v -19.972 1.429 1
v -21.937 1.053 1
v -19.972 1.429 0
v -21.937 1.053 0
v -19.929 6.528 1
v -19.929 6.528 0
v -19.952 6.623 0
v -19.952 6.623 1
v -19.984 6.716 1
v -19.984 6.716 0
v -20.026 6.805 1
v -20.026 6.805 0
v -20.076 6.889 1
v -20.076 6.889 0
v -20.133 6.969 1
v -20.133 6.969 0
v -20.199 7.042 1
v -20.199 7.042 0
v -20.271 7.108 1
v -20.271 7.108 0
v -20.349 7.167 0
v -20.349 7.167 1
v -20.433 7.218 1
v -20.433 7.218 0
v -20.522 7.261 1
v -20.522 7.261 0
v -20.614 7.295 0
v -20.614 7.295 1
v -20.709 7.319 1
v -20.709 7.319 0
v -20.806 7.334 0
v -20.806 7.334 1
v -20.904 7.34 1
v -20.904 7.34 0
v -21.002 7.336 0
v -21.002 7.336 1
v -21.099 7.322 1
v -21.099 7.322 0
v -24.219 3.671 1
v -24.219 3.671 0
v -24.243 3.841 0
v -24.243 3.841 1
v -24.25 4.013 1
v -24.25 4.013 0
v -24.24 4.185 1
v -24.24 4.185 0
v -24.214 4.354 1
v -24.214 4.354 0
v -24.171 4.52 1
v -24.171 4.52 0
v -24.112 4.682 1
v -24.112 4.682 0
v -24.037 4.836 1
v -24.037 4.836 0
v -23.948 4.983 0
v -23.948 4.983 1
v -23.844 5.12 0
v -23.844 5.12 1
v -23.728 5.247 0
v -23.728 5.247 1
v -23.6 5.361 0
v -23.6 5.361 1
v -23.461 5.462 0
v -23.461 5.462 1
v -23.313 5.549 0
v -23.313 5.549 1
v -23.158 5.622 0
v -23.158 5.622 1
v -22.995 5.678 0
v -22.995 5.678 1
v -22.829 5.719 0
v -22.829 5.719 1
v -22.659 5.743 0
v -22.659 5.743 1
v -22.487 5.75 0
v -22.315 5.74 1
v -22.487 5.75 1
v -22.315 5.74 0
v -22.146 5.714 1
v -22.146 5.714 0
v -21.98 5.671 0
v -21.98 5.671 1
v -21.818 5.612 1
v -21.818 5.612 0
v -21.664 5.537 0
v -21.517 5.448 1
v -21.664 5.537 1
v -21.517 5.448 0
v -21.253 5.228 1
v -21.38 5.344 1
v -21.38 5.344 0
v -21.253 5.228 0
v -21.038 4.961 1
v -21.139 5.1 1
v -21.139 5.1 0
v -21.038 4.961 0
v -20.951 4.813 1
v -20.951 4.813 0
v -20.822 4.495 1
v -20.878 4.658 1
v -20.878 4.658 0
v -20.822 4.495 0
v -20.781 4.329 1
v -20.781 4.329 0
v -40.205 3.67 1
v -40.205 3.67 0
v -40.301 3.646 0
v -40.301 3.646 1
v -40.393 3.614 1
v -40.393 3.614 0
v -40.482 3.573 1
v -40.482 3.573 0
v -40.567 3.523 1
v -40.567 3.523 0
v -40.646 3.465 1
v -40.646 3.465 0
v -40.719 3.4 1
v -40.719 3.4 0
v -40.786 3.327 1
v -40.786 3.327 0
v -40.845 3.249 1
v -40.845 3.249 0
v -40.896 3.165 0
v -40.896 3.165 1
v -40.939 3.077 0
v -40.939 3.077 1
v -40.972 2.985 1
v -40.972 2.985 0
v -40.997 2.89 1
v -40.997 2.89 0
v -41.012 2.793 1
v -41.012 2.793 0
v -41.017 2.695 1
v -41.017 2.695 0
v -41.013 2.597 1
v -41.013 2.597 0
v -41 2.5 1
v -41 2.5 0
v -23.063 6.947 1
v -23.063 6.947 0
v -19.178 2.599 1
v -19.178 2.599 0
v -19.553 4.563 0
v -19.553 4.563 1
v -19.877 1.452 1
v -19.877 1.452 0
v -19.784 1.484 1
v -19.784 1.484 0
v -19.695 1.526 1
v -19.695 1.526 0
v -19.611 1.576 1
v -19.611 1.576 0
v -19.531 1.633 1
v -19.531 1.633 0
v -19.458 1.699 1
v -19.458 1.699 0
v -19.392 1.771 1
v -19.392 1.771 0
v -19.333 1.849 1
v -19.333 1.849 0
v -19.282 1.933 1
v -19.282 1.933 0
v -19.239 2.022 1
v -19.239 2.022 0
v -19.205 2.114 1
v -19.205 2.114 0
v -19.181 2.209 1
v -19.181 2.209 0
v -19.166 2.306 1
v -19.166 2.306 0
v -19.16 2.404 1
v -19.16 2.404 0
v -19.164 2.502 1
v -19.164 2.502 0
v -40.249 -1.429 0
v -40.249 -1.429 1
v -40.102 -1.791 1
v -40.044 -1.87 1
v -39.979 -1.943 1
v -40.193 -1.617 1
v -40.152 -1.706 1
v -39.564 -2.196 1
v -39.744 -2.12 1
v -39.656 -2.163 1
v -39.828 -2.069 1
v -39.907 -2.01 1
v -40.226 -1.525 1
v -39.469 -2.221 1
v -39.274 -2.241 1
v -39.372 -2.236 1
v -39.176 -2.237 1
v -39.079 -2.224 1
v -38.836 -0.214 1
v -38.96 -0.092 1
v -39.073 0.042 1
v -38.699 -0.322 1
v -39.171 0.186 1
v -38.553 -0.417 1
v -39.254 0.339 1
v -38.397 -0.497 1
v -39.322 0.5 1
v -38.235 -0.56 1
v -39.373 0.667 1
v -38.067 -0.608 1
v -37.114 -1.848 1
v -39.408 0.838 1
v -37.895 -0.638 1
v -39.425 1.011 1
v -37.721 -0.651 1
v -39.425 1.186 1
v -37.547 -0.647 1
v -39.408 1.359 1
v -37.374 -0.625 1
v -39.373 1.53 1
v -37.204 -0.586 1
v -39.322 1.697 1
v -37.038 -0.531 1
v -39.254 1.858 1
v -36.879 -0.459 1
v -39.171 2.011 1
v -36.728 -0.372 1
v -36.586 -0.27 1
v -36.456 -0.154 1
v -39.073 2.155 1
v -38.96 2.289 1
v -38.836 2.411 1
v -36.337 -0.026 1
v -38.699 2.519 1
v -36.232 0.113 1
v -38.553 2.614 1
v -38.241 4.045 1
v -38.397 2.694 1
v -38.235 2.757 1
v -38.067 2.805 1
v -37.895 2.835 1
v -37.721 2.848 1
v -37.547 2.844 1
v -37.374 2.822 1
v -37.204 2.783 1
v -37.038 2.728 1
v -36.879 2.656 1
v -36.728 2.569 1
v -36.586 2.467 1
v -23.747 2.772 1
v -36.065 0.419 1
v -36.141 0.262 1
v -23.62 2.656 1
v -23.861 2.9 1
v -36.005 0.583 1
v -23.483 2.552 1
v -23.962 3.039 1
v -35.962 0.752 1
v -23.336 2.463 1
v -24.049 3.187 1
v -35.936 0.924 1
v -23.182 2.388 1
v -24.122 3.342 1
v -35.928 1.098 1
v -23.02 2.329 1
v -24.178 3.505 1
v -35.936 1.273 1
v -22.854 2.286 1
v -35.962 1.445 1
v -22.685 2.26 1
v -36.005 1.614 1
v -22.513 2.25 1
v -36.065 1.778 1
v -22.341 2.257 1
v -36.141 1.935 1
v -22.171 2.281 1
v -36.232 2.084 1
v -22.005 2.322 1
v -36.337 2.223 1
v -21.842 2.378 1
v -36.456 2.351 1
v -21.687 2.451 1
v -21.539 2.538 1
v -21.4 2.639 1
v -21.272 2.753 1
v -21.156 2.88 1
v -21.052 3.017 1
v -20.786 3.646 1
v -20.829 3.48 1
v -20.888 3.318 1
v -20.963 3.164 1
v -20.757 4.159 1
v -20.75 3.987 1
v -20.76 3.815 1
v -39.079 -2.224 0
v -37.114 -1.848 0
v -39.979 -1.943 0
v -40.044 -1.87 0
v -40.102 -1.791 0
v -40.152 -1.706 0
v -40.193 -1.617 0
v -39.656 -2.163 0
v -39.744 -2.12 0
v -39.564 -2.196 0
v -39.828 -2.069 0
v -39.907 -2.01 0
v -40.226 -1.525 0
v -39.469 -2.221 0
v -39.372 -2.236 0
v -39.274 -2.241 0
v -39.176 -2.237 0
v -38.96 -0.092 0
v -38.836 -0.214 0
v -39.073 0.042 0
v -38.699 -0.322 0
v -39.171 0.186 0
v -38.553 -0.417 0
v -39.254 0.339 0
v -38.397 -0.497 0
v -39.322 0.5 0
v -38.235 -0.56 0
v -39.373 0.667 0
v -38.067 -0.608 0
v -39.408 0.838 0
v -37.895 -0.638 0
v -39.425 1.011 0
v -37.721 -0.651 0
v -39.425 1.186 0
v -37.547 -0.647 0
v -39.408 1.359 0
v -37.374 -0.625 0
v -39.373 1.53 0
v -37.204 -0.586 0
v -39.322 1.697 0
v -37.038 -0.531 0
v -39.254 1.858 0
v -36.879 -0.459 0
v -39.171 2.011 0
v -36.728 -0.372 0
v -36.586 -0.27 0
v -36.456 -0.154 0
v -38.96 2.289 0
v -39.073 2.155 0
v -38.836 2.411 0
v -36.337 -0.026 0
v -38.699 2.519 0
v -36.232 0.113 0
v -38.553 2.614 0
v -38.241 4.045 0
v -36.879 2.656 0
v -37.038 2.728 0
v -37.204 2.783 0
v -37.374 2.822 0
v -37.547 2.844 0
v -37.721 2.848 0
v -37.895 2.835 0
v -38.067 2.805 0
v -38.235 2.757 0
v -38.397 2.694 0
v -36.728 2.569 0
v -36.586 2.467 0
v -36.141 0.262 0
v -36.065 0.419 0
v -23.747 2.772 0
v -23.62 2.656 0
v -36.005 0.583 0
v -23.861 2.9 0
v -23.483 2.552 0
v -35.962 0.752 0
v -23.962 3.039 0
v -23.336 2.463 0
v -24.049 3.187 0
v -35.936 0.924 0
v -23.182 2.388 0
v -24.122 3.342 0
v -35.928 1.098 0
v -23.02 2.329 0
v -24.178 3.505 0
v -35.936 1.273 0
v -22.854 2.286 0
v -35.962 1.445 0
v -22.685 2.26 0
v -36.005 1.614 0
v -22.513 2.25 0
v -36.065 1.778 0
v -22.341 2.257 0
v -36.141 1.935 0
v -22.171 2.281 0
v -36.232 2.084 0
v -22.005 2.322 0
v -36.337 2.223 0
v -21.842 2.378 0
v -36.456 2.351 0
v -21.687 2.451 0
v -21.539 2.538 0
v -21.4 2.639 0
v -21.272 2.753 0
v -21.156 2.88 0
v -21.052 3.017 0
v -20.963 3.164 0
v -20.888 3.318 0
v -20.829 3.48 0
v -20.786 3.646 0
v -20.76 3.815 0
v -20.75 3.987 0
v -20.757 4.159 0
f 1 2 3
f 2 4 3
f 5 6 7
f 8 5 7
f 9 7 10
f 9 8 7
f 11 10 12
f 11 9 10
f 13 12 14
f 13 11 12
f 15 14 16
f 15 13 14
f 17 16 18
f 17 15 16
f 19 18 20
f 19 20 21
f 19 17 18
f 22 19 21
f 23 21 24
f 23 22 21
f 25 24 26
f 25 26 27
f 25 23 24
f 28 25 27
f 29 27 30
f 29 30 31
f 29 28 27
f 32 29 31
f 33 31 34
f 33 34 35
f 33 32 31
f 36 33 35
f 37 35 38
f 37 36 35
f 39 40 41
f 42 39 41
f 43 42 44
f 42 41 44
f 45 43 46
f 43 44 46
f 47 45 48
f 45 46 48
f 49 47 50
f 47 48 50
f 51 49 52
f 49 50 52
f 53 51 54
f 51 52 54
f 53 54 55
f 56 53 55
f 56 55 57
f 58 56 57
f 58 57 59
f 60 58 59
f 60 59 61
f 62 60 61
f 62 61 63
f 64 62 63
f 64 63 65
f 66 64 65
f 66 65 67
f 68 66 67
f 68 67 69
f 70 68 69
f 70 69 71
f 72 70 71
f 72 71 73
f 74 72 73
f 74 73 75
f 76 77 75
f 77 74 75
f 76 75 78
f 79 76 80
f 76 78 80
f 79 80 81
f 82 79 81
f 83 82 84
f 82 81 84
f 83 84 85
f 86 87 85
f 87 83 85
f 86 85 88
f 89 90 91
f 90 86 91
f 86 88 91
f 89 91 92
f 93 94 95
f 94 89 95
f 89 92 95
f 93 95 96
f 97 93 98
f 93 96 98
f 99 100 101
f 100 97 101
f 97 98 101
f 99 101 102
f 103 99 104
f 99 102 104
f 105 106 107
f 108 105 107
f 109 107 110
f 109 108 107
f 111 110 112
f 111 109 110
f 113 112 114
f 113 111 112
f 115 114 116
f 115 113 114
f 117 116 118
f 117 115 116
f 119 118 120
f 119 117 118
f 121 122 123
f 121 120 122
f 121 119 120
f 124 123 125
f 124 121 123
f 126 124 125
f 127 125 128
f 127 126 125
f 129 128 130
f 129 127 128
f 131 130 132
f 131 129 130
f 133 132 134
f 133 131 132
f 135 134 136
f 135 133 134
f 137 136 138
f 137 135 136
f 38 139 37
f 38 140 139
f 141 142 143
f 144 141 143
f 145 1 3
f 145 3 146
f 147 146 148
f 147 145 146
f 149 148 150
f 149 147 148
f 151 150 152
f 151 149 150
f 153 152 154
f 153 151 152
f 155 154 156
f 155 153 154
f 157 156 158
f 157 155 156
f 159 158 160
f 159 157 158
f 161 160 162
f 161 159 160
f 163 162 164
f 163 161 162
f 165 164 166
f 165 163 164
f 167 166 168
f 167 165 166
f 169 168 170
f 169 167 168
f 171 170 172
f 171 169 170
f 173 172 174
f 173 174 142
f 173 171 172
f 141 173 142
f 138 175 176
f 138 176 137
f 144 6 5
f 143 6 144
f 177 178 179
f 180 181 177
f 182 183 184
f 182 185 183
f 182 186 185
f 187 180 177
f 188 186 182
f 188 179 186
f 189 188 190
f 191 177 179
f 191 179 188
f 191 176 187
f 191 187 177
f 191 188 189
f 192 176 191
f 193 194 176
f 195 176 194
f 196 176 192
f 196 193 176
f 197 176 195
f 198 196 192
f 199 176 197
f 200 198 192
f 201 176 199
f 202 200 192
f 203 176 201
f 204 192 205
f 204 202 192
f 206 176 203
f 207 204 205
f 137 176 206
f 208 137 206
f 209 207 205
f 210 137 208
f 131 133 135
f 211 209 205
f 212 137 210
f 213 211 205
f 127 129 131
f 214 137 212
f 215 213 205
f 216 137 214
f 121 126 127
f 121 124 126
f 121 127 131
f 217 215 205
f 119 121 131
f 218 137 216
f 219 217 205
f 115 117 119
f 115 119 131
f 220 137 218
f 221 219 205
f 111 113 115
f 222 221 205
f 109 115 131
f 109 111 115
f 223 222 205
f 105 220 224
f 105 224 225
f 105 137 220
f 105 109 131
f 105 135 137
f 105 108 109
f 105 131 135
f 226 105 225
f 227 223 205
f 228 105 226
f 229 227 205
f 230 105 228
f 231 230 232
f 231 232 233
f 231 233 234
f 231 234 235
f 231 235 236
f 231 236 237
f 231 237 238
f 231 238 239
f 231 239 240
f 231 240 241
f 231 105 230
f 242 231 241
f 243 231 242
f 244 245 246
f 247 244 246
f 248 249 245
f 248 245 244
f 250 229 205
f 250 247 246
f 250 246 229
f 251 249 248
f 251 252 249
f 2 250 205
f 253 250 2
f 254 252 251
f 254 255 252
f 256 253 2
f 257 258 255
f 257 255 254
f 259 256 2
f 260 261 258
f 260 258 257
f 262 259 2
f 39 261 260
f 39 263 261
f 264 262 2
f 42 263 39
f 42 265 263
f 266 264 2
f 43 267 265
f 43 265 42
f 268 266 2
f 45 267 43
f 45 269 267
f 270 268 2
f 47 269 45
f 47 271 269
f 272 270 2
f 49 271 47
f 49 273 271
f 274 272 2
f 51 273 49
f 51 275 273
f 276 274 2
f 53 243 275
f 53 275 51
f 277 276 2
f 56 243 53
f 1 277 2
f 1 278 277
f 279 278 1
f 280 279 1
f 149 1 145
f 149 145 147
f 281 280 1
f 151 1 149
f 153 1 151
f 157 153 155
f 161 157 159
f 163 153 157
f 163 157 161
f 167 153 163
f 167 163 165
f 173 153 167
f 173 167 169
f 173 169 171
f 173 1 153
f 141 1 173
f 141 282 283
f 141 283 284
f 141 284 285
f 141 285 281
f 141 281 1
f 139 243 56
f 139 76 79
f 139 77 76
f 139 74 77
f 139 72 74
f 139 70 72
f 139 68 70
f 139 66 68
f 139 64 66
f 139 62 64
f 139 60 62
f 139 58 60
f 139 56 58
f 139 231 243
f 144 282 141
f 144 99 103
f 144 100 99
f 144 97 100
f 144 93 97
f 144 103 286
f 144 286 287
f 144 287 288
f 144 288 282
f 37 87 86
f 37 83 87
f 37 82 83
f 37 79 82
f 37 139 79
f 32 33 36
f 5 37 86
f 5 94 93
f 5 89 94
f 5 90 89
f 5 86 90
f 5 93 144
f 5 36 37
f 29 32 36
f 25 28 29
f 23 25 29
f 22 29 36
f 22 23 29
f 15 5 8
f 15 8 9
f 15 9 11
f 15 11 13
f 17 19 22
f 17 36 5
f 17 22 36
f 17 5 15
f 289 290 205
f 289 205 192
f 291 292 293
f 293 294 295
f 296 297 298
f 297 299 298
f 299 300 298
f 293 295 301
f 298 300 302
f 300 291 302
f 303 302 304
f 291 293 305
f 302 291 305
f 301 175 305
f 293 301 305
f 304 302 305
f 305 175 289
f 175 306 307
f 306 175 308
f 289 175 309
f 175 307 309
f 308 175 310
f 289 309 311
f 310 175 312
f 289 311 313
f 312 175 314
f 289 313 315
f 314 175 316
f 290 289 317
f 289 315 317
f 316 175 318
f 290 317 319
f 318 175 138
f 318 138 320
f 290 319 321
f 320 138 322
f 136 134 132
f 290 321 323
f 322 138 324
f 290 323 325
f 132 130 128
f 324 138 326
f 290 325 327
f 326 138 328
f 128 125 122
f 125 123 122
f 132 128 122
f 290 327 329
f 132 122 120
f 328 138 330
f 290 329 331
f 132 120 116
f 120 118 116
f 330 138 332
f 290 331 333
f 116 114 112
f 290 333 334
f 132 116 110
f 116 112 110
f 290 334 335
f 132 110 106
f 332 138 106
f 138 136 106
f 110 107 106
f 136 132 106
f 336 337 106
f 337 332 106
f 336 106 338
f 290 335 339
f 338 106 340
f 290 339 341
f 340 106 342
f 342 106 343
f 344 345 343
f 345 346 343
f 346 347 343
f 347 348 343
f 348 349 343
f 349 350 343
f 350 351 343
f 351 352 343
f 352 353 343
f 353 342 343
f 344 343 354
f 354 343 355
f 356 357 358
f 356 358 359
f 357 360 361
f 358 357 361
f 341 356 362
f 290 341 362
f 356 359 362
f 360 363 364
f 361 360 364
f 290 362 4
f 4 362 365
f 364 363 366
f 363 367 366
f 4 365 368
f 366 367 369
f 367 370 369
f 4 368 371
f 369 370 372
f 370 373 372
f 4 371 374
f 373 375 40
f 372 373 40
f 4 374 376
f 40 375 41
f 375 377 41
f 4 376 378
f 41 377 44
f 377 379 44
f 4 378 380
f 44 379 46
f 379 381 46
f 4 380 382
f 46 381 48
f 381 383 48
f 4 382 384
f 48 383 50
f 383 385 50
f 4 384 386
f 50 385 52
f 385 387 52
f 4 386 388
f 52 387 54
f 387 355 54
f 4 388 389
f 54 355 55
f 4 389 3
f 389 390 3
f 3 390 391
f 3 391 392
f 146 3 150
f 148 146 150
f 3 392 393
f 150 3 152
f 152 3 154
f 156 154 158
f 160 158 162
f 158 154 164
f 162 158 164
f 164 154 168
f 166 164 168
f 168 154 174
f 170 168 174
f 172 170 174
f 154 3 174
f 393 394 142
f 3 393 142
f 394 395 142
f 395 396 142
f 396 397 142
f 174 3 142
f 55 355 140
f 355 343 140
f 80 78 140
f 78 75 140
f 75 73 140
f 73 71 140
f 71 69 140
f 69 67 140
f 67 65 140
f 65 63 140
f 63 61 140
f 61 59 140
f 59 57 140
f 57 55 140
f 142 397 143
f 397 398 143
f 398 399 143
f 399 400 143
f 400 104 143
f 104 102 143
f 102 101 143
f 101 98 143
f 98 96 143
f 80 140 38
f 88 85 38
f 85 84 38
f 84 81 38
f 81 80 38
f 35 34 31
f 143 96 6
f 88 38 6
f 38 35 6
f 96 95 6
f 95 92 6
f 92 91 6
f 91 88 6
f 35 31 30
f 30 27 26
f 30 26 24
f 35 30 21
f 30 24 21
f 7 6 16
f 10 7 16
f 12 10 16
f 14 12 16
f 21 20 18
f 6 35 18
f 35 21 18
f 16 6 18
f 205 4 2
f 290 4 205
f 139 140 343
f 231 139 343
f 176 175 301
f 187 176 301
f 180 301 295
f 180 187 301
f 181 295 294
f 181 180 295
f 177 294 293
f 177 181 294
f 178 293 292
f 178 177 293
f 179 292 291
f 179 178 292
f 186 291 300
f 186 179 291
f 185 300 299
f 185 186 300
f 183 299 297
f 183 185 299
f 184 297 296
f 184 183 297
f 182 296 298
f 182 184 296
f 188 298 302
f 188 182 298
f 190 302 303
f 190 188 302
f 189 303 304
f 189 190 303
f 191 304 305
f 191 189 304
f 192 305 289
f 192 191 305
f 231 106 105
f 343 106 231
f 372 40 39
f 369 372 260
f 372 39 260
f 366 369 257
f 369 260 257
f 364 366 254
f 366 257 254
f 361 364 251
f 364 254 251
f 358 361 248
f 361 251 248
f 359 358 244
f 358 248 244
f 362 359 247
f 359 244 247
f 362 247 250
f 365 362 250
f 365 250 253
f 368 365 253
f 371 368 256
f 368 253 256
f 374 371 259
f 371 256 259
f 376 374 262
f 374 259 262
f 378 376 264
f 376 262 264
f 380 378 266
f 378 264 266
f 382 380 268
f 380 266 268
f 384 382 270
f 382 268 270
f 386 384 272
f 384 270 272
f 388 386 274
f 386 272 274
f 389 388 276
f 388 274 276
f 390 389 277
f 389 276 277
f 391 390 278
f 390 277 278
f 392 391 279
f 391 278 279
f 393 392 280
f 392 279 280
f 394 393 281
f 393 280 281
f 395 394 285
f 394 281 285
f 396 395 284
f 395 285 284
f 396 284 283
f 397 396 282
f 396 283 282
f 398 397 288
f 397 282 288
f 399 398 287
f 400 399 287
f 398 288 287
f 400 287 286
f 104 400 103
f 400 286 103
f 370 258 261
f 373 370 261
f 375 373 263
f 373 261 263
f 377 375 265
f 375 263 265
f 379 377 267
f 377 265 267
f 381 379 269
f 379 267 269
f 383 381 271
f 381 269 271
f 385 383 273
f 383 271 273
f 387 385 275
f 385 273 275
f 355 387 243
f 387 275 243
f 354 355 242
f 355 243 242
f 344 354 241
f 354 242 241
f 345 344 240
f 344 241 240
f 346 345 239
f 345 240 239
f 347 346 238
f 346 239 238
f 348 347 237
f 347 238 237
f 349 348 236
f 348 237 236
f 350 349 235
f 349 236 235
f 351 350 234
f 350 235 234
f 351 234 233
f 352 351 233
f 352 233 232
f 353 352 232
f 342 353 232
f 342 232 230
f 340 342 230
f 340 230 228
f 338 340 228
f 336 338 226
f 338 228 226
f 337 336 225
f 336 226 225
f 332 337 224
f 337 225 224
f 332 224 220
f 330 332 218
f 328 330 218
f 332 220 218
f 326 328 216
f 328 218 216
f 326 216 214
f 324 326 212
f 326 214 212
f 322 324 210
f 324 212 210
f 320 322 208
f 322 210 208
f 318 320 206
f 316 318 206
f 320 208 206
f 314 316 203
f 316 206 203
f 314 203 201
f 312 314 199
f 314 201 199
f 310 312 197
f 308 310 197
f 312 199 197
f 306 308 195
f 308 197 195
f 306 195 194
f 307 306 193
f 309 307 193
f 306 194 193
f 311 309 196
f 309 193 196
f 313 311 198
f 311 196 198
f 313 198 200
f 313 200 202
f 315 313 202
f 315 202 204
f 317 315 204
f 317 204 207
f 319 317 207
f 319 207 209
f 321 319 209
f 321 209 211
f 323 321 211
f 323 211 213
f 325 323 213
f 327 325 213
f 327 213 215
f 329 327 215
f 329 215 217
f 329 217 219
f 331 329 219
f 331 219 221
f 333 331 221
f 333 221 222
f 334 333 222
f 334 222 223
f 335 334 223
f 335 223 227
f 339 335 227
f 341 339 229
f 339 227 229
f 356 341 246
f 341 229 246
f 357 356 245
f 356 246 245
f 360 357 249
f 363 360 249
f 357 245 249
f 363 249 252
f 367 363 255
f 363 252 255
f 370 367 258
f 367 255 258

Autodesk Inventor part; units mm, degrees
ref_plane "YZ Plane" through (0, 0, 0) normal (1, 0, 0) x (0, 1, 0)
ref_plane "XZ Plane" through (0, 0, 0) normal (0, 1, 0) x (-1, 0, 0)
ref_plane "XY Plane" through (0, 0, 0) normal (0, 0, 1) x (1, 0, 0)
sketch "Sketch1" plane through (0, 0, 0) normal (0, 0, 1) x (1, 0, 0)
  line L0 (-12.5, -2.5) -> (-12.5, 2.5) projected
  line L1 (-12.5, 2.5) -> (-17.5, 2.5) projected
  line L2 (-17.5, 2.5) -> (-17.5, 7.5) projected
  line L3 (-32.5, 7.5) -> (-17.5, 7.5) projected
  arc A0 (-32.5, 7.5) -> (-12.5, -2.5) centre (-12.5, 22.5) ccw projected
  circle A1 centre (-22.5, 4) radius 1.75
  circle A2 centre (-37.6776, 1.0985) radius 1.75
  line L4 (-22.5, 4) -> (-37.6776, 1.0985)
  line L5 (-22.5, 4) -> (-21.7788, 0.2278)
  line L6 (-22.5, 4) -> (-21.9367, 1.0534)
  line L7 (-37.6776, 1.0985) -> (-37.1143, -1.8482)
  line L8 (-21.9367, 1.0534) -> (-37.1143, -1.8482)
  line L9 (-22.5, 4) -> (-19.5534, 4.5633)
  line L10 (-21.9367, 1.0534) -> (-18.99, 1.6167)
  line L11 (-18.99, 1.6167) -> (-19.5534, 4.5633)
  line L12 (-37.6776, 1.0985) -> (-38.2409, 4.0451)
  line L13 (-23.0633, 6.9466) -> (-38.2409, 4.0451)
  line L14 (-23.0633, 6.9466) -> (-20.1167, 7.51)
  line L15 (-20.1167, 7.51) -> (-19.5534, 4.5633)
  line L16 (-37.1143, -1.8482) -> (-40.0609, -2.4115)
  line L17 (-40.0609, -2.4115) -> (-41.1875, 3.4818)
  line L18 (-41.1875, 3.4818) -> (-38.2409, 4.0451)
  line L19 (-18.99, 1.6167) -> (-40.0609, -2.4115)
  line L20 (-40.0609, -2.4115) -> (-41.1875, 3.4818)
  line L21 (-41.1875, 3.4818) -> (-20.1167, 7.51)
  point P0 (0, 0)
  dimension "d0" = 3.5
  dimension "d1" = 3.5
  dimension "d2" = 90
  dimension "d3" = 3
  dimension "d4" = 3
  dimension "d5" = 180
  dimension "d6" = 3
extrude "Extrusion1" add sketch "Sketch1" along normal blind 1 contours L8 L7 A2 L4 A0 | A0 L4 A1 L5 L8 | L4 A2 L12 L13 A0 | A0 L13 L14 L3 L15 L9 A1 L4 | L5 A1 L9 L11 L10 | L16 L17 L18 L12 A2 L7 | L4 L5 A1 | L4 L12 A2 | A2 L7 L4 | L5 L9 A1 | A2 L12 L7 | L3 L14 L15
sketch "Sketch2" plane through (0, 0, 1) normal (0, 0, 1) x (1, 0, 0)
  arc A0 (-20.7811, 4.3286) -> (-24.2189, 3.6714) centre (-22.5, 4) ccw projected
  line L0 (-68.111, -8.1624) -> (-72.0972, 25.6031) projected
  line L1 (-29.38, -3.59) -> (-68.111, -8.1624) projected
  line L2 (-33.3662, 30.1755) -> (-29.38, -3.59) projected
  line L3 (-72.0972, 25.6031) -> (-33.3662, 30.1755) projected
  line L4 (-24.2189, 3.6714) -> (-20.7811, 4.3286) projected
  circle A1 centre (-22.5, 4) radius 1.75
  line L5 (-37.6776, 1.0985) -> (-35.9587, 1.4271) projected
  circle A2 centre (-37.6776, 1.0985) radius 1.75
  point P0 (0, 0)
extrude "Extrusion2" cut sketch "Sketch2" against normal blind 1 contours L4 A0 | A1 L4 | A2
fillet "Fillet1" radius 1 4 edges at (-40.0609, -2.4115, 0.5) (-41.1875, 3.4818, 0.5) (-18.99, 1.6167, 0.5) (-20.1167, 7.51, 0.5)
properties part number "LeverArm"
